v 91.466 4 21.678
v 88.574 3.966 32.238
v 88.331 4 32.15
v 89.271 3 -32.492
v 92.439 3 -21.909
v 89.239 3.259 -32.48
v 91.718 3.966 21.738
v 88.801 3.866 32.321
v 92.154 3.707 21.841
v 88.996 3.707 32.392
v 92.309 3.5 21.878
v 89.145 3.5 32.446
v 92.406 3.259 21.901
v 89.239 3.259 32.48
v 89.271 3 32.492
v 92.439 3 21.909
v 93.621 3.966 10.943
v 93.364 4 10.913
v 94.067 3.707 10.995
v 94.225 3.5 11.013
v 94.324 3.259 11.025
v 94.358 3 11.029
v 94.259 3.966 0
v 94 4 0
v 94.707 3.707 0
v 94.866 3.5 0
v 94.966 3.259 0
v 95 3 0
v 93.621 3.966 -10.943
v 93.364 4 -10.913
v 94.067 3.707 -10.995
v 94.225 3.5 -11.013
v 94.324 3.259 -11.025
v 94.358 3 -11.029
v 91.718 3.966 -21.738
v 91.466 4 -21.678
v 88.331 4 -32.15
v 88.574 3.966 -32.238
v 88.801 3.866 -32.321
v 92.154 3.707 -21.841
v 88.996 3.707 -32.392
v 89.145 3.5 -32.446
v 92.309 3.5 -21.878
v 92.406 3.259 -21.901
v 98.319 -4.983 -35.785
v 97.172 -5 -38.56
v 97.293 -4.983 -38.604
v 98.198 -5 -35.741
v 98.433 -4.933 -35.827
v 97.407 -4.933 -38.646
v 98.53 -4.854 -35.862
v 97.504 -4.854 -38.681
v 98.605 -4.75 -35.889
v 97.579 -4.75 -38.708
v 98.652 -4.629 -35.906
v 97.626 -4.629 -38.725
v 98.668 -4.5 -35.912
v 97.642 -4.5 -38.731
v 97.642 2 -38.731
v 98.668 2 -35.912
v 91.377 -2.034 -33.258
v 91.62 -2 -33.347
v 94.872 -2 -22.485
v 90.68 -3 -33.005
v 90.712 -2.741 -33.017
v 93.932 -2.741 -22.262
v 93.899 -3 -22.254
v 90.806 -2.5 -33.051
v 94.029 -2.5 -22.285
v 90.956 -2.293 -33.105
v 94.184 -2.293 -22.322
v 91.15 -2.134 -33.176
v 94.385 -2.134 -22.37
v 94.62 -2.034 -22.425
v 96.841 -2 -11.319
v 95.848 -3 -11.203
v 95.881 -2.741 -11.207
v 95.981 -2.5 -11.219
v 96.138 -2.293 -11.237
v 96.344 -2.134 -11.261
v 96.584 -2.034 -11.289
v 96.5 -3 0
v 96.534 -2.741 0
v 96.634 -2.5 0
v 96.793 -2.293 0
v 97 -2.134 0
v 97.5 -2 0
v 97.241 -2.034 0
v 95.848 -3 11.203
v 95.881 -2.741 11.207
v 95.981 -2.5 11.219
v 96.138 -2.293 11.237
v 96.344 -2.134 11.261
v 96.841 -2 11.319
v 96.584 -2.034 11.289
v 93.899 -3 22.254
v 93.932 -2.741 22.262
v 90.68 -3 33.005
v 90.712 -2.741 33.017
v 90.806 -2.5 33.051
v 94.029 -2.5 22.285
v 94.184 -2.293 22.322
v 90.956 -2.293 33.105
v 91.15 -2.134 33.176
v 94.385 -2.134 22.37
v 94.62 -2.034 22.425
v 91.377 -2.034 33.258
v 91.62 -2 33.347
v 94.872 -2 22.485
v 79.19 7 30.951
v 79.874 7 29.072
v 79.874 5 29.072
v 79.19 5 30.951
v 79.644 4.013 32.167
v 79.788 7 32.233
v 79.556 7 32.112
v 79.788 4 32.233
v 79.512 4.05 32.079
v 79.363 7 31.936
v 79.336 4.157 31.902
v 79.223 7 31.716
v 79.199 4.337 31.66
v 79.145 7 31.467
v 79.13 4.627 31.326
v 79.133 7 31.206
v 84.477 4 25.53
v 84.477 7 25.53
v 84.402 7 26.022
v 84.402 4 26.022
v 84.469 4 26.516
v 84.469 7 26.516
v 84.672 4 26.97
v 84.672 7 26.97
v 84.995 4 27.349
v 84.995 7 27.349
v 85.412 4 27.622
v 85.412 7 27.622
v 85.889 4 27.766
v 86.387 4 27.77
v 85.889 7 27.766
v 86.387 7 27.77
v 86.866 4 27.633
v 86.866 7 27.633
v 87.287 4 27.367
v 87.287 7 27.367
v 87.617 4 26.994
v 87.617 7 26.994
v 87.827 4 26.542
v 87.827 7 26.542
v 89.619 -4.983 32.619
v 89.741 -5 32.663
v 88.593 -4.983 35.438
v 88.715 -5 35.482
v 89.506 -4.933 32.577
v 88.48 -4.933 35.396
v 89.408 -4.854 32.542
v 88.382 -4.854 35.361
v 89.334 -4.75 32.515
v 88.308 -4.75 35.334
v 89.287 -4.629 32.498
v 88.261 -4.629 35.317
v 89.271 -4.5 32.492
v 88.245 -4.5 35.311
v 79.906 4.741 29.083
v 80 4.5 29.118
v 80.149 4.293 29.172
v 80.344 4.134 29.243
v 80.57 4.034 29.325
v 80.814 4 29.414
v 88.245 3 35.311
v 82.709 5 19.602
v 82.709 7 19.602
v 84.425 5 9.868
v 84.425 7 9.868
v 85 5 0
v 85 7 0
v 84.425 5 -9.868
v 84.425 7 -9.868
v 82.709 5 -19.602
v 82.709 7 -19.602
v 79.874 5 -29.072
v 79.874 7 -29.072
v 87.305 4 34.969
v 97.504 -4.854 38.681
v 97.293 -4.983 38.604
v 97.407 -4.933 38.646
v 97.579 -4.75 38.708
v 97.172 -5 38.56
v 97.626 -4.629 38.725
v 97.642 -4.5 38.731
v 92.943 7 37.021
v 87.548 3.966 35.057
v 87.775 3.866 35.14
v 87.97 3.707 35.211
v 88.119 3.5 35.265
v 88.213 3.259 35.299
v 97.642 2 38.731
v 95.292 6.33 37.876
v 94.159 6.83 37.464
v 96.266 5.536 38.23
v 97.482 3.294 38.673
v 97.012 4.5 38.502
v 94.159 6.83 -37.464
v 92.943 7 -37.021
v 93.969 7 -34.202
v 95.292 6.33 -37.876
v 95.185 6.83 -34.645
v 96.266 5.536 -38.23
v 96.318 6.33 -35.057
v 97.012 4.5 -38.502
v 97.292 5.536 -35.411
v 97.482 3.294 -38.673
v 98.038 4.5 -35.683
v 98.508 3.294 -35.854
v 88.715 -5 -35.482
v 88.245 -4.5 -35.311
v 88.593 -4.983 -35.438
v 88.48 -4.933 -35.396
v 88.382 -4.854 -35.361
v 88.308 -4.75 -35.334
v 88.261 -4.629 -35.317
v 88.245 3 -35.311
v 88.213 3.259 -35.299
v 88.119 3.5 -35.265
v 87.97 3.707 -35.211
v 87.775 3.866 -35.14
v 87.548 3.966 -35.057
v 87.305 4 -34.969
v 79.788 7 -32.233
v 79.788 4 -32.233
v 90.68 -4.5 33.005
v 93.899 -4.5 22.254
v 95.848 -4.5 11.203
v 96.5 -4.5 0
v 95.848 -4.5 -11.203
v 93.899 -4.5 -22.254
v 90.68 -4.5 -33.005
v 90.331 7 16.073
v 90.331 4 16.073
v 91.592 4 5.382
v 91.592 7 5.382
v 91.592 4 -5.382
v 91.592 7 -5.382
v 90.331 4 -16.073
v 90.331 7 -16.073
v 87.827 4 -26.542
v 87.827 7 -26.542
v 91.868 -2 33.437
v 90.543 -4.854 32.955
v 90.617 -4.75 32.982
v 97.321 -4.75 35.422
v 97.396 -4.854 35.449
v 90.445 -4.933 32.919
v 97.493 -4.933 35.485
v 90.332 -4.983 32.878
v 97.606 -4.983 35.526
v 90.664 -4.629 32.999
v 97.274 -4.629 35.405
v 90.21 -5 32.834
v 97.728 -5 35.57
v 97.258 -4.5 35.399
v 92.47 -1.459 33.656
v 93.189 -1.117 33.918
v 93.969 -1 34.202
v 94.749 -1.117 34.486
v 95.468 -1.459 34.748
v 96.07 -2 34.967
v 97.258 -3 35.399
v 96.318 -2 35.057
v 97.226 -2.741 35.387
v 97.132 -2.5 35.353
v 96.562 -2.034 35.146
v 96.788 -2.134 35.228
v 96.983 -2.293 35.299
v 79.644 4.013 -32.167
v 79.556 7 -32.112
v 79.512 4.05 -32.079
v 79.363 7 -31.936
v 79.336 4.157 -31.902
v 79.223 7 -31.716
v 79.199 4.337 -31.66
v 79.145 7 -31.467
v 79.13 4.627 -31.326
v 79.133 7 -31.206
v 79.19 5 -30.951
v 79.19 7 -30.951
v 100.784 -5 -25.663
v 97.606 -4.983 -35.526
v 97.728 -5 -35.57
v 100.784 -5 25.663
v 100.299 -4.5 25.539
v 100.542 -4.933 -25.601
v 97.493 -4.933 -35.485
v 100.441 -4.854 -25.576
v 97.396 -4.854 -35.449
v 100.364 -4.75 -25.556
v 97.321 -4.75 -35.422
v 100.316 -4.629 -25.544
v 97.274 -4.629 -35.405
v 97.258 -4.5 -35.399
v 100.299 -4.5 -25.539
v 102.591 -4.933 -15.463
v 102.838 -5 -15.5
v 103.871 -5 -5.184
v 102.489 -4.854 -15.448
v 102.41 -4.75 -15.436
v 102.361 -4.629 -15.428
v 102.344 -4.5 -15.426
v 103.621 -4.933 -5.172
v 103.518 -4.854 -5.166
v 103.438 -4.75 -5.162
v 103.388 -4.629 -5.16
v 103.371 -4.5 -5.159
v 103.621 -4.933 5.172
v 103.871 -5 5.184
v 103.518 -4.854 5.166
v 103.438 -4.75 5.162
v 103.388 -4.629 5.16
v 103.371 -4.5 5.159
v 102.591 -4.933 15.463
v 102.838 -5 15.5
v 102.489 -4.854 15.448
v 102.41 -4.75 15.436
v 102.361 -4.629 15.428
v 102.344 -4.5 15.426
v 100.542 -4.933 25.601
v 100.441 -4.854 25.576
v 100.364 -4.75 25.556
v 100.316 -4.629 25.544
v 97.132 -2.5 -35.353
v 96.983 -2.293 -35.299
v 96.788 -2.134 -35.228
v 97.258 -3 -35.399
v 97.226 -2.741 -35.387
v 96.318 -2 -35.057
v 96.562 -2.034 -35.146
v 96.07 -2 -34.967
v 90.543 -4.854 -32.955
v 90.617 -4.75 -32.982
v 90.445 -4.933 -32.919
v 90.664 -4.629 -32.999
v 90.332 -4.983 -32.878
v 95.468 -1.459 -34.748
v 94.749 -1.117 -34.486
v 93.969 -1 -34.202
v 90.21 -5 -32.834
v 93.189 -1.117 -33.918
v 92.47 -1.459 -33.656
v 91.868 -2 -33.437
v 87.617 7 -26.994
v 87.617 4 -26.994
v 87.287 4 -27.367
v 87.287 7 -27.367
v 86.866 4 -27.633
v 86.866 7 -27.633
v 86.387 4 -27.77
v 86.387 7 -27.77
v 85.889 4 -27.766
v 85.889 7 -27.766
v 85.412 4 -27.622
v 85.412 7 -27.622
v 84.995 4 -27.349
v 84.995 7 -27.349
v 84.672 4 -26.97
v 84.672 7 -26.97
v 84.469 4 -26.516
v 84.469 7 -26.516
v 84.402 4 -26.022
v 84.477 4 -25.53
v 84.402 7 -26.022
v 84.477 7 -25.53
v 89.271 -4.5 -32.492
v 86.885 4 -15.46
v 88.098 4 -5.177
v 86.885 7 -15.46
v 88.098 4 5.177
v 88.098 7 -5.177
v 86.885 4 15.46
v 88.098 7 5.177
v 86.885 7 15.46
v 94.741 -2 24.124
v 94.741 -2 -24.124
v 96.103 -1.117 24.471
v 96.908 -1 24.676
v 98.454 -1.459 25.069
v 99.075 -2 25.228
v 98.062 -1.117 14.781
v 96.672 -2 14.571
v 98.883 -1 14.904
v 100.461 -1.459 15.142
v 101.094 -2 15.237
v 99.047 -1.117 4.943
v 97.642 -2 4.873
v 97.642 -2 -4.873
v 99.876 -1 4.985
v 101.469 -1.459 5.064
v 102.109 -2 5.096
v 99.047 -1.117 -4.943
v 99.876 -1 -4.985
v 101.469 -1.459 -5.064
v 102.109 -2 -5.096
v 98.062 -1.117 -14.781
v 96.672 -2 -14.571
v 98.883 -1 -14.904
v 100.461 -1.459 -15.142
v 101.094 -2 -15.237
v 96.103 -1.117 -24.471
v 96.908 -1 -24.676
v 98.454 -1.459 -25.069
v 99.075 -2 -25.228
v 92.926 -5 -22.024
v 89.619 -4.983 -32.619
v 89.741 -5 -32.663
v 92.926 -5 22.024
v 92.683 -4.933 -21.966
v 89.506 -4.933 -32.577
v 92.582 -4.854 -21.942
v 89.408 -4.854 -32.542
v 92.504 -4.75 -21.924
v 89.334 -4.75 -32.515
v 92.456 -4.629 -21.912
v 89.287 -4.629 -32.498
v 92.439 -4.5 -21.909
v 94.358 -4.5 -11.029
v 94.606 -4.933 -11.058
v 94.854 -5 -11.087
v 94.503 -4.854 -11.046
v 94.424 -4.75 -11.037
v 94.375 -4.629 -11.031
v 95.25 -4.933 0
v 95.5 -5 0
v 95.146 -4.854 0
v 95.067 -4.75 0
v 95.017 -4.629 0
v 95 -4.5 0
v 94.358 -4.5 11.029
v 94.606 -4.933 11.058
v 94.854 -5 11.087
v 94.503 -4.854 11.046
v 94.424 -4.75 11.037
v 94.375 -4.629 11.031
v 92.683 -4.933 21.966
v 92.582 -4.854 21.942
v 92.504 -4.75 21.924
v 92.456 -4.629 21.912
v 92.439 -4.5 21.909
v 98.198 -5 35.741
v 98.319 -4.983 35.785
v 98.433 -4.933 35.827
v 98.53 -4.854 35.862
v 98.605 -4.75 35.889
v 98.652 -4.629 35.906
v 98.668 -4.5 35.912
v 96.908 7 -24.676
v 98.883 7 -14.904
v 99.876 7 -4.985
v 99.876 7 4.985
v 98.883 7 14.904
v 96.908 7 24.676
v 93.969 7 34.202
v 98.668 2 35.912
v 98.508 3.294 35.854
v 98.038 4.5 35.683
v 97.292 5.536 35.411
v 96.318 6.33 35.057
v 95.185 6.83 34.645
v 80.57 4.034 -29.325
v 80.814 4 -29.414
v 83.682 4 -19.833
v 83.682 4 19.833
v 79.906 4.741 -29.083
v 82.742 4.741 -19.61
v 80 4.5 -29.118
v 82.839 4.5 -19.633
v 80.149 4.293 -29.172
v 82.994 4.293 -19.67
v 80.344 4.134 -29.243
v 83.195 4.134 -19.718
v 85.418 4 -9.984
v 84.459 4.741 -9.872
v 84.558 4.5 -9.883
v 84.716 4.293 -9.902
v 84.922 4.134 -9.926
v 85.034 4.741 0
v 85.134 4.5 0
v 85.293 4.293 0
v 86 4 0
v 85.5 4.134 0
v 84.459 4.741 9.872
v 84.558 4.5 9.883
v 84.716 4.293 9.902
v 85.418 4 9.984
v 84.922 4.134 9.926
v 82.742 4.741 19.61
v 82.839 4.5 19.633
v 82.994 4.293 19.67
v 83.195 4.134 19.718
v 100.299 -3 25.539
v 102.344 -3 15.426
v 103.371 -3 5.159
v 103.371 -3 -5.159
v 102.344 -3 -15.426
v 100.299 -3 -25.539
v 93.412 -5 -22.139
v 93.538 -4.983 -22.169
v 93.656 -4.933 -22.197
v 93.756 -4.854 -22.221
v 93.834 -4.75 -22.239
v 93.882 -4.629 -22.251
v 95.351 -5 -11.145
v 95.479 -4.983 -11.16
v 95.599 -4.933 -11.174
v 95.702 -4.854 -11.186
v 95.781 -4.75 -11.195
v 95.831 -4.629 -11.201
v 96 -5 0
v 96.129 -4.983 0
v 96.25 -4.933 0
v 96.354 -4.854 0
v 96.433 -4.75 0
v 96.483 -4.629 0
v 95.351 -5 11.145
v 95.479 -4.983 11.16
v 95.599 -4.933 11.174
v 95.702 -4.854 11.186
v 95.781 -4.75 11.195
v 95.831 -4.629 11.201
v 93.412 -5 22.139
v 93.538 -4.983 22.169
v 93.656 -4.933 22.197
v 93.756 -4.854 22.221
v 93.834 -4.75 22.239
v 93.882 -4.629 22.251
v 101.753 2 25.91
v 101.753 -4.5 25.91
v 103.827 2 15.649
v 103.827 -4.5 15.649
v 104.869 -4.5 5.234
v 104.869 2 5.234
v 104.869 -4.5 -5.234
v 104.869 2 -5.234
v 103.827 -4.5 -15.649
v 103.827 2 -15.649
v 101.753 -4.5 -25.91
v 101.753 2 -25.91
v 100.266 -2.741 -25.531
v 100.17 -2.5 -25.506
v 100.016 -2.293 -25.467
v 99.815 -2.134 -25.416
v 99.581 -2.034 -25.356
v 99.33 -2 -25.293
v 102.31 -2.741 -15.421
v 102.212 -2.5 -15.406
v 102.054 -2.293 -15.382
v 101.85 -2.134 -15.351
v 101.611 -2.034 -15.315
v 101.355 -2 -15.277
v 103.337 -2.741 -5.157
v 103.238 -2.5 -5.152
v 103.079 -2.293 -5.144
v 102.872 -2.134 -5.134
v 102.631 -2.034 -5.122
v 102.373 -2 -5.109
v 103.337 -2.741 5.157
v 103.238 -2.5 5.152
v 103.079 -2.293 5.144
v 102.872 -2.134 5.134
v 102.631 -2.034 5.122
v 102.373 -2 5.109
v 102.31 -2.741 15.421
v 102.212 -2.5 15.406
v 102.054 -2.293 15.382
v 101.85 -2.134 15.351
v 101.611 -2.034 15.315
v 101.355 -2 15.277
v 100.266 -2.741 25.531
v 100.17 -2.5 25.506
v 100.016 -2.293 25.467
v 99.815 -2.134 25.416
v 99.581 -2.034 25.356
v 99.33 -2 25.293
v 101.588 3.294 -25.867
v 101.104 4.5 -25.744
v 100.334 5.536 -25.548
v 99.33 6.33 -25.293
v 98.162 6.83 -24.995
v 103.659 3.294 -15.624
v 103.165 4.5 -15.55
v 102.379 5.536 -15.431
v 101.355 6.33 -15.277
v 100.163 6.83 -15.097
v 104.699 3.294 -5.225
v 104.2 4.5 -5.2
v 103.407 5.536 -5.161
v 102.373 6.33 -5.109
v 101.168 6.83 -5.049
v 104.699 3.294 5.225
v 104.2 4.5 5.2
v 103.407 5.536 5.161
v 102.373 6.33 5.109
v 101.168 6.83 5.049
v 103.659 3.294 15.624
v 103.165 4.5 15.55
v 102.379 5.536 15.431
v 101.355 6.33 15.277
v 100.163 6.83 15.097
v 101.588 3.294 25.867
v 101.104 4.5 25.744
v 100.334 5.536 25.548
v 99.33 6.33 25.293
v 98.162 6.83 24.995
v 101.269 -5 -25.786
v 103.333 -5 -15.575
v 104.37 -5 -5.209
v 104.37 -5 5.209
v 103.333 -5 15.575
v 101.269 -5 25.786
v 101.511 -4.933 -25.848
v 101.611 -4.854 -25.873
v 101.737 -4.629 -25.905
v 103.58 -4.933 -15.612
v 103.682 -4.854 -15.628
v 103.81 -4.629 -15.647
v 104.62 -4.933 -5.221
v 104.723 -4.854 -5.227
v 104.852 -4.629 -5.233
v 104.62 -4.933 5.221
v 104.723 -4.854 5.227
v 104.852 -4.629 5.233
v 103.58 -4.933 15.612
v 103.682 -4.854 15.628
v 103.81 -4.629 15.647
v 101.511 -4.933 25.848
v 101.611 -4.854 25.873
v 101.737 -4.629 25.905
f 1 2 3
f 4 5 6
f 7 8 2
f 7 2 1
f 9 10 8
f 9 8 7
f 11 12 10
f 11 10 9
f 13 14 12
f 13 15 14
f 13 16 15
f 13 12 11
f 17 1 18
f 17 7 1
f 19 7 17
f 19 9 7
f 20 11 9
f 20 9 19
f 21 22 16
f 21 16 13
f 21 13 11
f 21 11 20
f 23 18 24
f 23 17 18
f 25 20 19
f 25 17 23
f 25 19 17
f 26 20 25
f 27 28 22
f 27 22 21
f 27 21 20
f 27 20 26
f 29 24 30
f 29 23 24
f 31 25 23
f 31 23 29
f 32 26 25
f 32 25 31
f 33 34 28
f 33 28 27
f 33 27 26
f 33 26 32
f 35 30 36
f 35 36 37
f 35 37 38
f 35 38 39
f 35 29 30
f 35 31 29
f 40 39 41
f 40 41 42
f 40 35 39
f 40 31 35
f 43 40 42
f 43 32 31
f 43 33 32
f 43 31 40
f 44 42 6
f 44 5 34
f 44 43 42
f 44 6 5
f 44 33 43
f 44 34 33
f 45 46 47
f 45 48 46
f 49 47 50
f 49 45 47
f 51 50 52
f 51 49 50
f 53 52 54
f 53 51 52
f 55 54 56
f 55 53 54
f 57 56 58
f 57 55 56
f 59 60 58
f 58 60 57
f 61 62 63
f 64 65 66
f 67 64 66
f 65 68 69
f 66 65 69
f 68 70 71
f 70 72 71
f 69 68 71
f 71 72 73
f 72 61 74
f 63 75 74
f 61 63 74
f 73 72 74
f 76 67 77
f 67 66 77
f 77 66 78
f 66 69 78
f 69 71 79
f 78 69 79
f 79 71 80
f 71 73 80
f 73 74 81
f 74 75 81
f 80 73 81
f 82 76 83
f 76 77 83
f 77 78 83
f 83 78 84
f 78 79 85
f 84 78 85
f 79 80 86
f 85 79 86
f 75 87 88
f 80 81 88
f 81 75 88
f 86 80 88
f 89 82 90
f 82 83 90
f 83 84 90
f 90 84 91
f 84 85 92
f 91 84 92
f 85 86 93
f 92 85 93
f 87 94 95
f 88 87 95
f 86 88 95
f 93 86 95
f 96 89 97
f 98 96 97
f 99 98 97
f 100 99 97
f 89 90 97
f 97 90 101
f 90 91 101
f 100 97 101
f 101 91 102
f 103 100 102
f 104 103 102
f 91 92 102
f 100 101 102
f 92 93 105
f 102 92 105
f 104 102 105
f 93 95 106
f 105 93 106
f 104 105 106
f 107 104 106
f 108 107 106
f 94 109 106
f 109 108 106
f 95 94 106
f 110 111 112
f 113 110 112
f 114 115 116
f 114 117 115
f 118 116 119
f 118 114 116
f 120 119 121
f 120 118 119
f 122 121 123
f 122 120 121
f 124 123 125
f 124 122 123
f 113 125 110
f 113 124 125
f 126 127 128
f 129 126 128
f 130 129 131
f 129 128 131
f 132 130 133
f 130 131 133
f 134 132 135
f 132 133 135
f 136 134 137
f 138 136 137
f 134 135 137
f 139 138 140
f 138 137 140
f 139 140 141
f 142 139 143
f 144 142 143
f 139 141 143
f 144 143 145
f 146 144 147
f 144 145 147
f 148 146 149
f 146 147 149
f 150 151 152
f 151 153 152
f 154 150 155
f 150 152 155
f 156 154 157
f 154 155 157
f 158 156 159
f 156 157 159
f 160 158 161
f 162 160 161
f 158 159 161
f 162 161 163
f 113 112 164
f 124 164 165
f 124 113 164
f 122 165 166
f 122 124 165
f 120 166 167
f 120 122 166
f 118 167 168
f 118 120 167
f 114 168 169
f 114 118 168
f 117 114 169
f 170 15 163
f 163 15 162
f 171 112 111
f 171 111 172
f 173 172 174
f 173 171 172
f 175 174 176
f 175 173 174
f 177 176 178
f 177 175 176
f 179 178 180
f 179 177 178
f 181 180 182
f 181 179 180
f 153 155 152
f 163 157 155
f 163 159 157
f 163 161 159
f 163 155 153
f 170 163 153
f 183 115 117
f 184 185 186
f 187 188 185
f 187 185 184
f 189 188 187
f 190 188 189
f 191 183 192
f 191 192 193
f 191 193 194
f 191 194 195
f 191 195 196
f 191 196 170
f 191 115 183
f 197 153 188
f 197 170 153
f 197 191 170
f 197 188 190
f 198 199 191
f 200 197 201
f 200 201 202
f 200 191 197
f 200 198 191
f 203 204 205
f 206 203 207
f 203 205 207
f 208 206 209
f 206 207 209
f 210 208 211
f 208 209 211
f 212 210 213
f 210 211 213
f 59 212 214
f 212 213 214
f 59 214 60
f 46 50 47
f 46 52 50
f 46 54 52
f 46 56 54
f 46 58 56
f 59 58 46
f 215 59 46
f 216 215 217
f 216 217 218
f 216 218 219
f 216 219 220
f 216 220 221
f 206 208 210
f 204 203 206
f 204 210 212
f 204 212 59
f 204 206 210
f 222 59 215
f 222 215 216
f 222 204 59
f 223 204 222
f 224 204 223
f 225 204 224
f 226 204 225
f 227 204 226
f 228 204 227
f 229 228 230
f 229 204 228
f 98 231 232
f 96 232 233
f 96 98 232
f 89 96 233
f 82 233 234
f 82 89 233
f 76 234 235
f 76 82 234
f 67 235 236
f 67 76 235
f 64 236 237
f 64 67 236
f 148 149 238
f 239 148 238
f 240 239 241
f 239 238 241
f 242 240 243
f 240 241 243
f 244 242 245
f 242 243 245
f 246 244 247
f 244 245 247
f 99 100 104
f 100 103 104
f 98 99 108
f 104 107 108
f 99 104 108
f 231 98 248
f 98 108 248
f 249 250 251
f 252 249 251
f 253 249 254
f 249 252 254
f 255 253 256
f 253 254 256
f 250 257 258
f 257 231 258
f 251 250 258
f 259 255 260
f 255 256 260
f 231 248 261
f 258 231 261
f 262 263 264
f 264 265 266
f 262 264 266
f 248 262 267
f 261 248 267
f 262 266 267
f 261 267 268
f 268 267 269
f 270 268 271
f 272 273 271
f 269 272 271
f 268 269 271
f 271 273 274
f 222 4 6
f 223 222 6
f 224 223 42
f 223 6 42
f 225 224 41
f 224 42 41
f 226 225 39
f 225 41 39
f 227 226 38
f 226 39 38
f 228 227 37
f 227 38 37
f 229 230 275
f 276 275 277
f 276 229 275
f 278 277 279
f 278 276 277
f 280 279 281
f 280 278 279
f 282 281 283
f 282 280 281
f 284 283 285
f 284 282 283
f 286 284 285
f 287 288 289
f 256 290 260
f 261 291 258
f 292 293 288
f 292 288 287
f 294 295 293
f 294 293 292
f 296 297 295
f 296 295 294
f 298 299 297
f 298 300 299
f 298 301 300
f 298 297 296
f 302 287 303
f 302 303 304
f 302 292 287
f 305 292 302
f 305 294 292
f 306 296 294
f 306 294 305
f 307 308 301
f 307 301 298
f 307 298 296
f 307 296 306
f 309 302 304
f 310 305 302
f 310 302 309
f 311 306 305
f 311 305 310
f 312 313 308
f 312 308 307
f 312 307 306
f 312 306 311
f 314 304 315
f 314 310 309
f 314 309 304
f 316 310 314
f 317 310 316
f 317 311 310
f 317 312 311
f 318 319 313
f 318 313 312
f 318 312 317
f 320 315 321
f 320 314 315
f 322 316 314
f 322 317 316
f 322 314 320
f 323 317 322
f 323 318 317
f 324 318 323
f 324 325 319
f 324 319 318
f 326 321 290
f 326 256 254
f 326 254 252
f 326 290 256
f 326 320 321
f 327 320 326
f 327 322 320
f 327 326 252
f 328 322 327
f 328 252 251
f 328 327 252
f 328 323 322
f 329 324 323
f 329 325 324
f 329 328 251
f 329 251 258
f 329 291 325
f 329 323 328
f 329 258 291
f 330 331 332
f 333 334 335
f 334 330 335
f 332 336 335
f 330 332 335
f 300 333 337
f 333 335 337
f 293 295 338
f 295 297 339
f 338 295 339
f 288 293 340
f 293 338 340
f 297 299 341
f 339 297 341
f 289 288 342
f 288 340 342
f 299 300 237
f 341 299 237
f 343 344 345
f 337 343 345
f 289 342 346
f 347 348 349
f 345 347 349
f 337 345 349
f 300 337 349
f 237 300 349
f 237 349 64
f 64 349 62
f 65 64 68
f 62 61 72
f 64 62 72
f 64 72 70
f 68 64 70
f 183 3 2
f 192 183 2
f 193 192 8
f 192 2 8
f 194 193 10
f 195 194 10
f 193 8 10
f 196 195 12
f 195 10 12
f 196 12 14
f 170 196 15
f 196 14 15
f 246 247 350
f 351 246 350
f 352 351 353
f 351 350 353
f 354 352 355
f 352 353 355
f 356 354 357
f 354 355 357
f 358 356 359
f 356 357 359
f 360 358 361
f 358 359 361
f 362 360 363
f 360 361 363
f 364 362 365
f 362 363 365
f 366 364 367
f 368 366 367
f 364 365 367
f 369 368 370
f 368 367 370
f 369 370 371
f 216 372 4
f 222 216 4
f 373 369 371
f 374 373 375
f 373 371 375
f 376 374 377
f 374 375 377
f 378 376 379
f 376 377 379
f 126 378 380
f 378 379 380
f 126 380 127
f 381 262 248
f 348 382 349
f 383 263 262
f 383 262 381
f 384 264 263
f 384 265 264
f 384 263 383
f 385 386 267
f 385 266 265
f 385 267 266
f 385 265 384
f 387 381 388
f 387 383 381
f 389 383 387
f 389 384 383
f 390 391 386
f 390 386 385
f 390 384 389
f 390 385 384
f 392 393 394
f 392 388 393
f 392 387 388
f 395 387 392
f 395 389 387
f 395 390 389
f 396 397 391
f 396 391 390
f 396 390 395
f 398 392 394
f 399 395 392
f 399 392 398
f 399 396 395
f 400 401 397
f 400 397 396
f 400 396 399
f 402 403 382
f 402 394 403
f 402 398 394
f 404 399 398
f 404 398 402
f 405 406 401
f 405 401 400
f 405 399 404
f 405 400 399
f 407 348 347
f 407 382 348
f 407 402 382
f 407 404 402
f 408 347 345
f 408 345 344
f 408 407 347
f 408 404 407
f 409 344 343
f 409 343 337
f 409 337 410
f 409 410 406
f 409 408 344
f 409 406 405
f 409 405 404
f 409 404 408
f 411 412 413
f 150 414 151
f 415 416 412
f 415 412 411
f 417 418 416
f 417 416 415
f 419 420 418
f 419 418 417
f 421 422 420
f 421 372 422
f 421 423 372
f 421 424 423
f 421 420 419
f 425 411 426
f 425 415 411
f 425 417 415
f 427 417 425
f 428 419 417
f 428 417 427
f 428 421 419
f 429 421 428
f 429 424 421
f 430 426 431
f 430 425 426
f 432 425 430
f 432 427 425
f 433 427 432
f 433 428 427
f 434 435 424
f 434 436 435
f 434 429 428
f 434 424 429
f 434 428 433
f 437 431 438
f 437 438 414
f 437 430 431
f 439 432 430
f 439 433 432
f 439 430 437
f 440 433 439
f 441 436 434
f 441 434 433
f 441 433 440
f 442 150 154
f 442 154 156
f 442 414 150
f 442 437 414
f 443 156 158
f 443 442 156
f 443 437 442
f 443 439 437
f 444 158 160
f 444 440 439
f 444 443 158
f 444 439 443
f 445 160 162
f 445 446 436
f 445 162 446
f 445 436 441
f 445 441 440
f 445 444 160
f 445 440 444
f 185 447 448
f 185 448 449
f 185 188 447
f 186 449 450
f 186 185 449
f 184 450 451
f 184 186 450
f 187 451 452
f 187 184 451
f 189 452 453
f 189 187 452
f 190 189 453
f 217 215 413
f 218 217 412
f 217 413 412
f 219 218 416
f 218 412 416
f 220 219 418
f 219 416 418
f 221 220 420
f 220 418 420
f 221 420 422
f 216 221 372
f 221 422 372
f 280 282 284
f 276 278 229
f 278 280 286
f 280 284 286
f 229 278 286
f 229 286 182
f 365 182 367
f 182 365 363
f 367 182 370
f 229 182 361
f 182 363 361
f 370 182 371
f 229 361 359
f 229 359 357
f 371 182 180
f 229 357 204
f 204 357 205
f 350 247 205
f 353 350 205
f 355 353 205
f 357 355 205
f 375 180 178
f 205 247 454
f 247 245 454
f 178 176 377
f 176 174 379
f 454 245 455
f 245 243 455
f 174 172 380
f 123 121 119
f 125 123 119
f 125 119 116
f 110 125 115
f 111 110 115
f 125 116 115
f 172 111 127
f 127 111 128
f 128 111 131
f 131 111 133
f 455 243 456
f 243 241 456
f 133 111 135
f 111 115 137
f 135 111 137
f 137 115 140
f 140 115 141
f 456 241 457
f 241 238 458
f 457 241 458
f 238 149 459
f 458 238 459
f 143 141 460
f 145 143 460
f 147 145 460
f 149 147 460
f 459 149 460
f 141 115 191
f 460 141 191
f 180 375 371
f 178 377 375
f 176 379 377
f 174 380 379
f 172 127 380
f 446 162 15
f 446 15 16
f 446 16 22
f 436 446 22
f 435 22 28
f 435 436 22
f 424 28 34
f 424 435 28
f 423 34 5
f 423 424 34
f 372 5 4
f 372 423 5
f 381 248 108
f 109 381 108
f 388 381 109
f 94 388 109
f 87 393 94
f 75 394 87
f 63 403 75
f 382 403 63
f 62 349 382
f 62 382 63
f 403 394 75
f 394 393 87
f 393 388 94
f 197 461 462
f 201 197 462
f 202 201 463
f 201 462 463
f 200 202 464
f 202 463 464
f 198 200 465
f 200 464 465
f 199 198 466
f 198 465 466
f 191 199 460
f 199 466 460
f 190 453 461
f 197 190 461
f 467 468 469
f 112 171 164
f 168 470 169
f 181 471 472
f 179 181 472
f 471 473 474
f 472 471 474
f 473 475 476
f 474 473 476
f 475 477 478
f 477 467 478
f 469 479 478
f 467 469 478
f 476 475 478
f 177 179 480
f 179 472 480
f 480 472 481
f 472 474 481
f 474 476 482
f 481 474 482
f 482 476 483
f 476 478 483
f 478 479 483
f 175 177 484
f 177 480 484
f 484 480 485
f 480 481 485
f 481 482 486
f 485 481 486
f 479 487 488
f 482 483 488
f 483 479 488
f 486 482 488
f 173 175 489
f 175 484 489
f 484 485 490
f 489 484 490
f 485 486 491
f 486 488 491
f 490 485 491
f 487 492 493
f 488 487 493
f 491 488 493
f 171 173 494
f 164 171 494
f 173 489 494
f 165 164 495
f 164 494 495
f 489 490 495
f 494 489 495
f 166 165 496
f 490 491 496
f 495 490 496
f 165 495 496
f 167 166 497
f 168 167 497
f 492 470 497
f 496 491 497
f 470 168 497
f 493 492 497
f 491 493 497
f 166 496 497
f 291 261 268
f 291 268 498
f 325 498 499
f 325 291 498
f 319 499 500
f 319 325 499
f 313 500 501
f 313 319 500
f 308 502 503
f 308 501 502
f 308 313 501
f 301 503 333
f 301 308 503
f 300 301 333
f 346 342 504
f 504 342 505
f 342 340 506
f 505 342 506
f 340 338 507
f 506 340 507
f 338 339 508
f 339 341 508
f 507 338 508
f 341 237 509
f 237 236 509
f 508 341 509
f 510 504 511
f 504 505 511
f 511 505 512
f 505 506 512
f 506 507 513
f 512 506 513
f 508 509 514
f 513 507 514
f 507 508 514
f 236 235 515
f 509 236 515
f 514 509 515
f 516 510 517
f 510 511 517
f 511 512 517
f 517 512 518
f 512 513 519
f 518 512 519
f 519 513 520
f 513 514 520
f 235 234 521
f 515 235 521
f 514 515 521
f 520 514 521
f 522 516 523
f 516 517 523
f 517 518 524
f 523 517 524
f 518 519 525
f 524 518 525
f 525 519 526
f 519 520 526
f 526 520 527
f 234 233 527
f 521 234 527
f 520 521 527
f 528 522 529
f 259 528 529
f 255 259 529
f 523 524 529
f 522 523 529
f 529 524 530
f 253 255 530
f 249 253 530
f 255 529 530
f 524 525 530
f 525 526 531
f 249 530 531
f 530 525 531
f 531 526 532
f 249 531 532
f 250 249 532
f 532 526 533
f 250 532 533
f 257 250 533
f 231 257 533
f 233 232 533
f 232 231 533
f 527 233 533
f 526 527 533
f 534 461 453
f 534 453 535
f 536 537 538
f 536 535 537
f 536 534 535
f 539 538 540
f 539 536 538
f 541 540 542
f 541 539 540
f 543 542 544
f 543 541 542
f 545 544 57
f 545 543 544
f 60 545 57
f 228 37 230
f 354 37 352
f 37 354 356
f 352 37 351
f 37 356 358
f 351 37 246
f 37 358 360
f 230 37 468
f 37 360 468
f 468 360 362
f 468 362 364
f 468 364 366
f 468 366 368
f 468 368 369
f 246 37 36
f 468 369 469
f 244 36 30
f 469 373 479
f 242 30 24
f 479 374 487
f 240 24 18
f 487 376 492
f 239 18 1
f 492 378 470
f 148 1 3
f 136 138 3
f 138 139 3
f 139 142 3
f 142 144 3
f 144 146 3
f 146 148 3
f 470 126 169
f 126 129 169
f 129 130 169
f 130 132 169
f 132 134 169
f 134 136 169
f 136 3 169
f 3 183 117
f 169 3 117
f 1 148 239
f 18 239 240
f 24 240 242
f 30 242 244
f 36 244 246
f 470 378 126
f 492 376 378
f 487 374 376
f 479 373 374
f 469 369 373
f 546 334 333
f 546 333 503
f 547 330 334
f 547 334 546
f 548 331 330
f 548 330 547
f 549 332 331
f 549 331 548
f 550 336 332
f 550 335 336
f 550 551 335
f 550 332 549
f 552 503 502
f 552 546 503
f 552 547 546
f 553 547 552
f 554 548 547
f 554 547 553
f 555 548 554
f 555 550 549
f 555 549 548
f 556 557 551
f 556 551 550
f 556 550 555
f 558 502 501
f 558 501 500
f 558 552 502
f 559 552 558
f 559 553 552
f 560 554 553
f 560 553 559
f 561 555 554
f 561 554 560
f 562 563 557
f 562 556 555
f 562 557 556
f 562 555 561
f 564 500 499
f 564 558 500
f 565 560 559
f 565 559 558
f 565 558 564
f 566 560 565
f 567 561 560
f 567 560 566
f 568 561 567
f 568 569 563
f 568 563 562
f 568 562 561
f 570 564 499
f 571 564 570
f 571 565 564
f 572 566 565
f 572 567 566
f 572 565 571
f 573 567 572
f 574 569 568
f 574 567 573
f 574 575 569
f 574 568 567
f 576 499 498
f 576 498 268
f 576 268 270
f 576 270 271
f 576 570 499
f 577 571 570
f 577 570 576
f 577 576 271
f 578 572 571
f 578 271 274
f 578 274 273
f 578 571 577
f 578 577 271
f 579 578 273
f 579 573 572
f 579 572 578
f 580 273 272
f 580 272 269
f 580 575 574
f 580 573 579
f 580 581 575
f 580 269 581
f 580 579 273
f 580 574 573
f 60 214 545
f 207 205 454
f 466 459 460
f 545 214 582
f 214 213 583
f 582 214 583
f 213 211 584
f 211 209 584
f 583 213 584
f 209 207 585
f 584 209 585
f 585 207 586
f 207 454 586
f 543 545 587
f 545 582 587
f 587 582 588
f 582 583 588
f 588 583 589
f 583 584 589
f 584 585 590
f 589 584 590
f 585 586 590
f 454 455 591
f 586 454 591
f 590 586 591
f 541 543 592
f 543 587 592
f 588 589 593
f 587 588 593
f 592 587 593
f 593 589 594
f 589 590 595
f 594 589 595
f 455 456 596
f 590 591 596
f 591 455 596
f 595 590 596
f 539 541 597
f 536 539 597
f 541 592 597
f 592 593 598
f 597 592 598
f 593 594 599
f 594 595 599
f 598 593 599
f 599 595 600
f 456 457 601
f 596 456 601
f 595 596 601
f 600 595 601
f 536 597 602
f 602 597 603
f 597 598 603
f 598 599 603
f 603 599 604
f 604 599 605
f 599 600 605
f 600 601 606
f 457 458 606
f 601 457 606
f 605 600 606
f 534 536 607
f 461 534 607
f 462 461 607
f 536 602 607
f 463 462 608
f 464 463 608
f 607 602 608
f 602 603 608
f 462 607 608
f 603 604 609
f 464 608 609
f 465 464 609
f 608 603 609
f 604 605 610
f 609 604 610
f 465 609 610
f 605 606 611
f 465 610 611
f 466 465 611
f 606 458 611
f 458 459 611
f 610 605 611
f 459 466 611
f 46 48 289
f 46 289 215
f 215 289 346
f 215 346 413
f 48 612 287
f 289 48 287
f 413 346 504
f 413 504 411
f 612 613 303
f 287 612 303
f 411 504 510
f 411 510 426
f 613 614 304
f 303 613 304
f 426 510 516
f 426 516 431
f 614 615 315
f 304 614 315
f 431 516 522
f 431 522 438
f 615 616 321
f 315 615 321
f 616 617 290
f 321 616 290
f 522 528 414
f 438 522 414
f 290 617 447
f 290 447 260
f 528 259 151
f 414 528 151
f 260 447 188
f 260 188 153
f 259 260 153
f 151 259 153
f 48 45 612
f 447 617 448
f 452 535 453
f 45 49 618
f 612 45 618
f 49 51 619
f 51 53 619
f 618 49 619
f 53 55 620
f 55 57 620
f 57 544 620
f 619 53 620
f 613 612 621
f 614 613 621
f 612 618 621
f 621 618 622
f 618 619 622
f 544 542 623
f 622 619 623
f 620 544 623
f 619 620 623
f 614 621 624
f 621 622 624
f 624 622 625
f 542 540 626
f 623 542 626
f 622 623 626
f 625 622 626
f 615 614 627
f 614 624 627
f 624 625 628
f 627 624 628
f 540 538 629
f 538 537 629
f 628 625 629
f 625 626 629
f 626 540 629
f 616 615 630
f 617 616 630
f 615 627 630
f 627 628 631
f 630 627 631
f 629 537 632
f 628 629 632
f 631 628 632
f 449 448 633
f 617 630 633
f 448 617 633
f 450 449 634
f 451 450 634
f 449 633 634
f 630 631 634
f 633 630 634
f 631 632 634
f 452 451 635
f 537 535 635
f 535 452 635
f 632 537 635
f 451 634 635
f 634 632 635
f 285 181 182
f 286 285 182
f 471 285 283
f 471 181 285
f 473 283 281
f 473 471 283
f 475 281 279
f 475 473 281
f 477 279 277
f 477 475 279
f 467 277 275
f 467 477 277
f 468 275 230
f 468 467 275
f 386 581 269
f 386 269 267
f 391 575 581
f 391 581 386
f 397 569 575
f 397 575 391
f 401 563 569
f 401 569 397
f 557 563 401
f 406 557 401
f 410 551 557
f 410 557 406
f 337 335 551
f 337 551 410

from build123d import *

# Parameters (mm, degrees)
REVOLVE_1_ANGLE     = 40
CUT_EXTRUDE_1_DEPTH = 10
FILLET_1_R          = 5
FILLET_3_R          = 1
FILLET_4_R          = 1
EXTRUDE_1_DEPTH     = 3
EXTRUDE_2_DEPTH     = 3
FILLET_6_R          = 0.5
FILLET_7_R          = 1


with BuildPart() as part:
    # 草图2 → 旋转1 (revolve, symmetric)
    with BuildSketch(Plane.XY) as revolve_1_sk:
        with BuildLine():
            Line((95, 4), (95, -5))
            Line((95, -5), (96.5, -5))
            Line((96.5, -5), (96.5, -2))
            Line((96.5, -2), (97.763932023, -2))
            ThreePointArc((97.763932023, -2), (100, -1), (102.236067977, -2))
            Line((102.236067977, -2), (103.5, -2))
            Line((103.5, -2), (103.5, -5))
            Line((103.5, -5), (105, -5))
            Line((105, -5), (105, 7))
            Line((105, 7), (85, 7))
            Line((85, 7), (85, 4))
            Line((85, 4), (95, 4))
        make_face()
    revolve(axis=Axis((0, 24.366902053, 0), (0, -1, 0)), revolution_arc=REVOLVE_1_ANGLE / 2)
    revolve(revolve_1_sk.sketch, axis=Axis((0, 24.366902053, 0), (0, 1, 0)), revolution_arc=REVOLVE_1_ANGLE / 2)

    # 草图3 → 切除-拉伸1 (cut)
    with BuildSketch(Plane(origin=(0, 7, 0), x_dir=(1, 0, 0), z_dir=(0, 1, 0))):
        with BuildLine():
            ThreePointArc((87.826997293, -26.542061834), (91.75, 1.18e-07), (87.826997225, 26.542062061))
            ThreePointArc((87.826997225, 26.542062061), (85.645571172, 27.710984674), (84.476648452, 25.529558679))
            ThreePointArc((84.476648452, 25.529558679), (88.25, 3.69e-07), (84.476648665, -25.529557973))
            ThreePointArc((84.476648665, -25.529557973), (85.645570933, -27.710984602), (87.826997293, -26.542061834))
        make_face()
    extrude(amount=-CUT_EXTRUDE_1_DEPTH, mode=Mode.SUBTRACT)

    # 圆角1
    fillet_1_edges = [part.edges().sort_by_distance(p)[0] for p in [
        (105, 7, 0),
    ]]
    fillet(fillet_1_edges, radius=FILLET_1_R)

    # 圆角3
    fillet_3_edges = [part.edges().sort_by_distance(p)[0] for p in [
        (95, 4, 0),
    ]]
    fillet(fillet_3_edges, radius=FILLET_3_R)

    # 圆角4
    fillet_4_edges = [part.edges().sort_by_distance(p)[0] for p in [
        (103.5, -2, 0),
        (96.5, -2, 0),
    ]]
    fillet(fillet_4_edges, radius=FILLET_4_R)

    # 草图5 → 凸台-拉伸1 (add)
    with BuildSketch(Plane(origin=(0, 0, 0), x_dir=(0.9396926207859081, 0, 0.34202014332566955), z_dir=(-0.34202014332566955, 0, 0.9396926207859082))):
        with BuildLine():
            Line((96.5, -5), (103.5, -5))
            Line((103.5, -5), (103.5, -3))
            ThreePointArc((103.5, -3), (103.207106781, -2.292893219), (102.5, -2))
            Line((102.5, -2), (102.236067977, -2))
            ThreePointArc((102.236067977, -2), (100, -1), (97.763932023, -2))
            Line((97.763932023, -2), (97.5, -2))
            ThreePointArc((97.5, -2), (96.792893219, -2.292893219), (96.5, -3))
            Line((96.5, -3), (96.5, -5))
        make_face()
        with BuildLine():
            Line((103.5, -5), (105, -5))
            Line((105, -5), (105, 2))
            ThreePointArc((105, 2), (103.535533906, 5.535533906), (100, 7))
            Line((100, 7), (85, 7))
            Line((85, 7), (85, 4))
            Line((85, 4), (94, 4))
            ThreePointArc((94, 4), (94.707106781, 3.707106781), (95, 3))
            Line((95, 3), (95, -5))
            Line((95, -5), (96.5, -5))
            Line((96.5, -5), (96.5, -3))
            ThreePointArc((96.5, -3), (96.792893219, -2.292893219), (97.5, -2))
            Line((97.5, -2), (97.763932023, -2))
            ThreePointArc((97.763932023, -2), (100, -1), (102.236067977, -2))
            Line((102.236067977, -2), (102.5, -2))
            ThreePointArc((102.5, -2), (103.207106781, -2.292893219), (103.5, -3))
            Line((103.5, -3), (103.5, -5))
        make_face()
    extrude(amount=EXTRUDE_1_DEPTH)

    # 草图6 → 凸台-拉伸2 (add)
    with BuildSketch(Plane(origin=(0, 0, 0), x_dir=(-0.9396926207859082, 0, 0.34202014332566943), z_dir=(-0.34202014332566943, 0, -0.9396926207859082))):
        with BuildLine():
            Line((-103.5, -5), (-96.5, -5))
            Line((-96.5, -5), (-96.5, -3))
            ThreePointArc((-96.5, -3), (-96.792893219, -2.292893219), (-97.5, -2))
            Line((-97.5, -2), (-97.763932023, -2))
            ThreePointArc((-97.763932023, -2), (-100, -1), (-102.236067977, -2))
            Line((-102.236067977, -2), (-102.5, -2))
            ThreePointArc((-102.5, -2), (-103.207106781, -2.292893219), (-103.5, -3))
            Line((-103.5, -3), (-103.5, -5))
        make_face()
        with BuildLine():
            Line((-85, 4), (-85, 7))
            Line((-85, 7), (-100, 7))
            ThreePointArc((-100, 7), (-103.535533906, 5.535533906), (-105, 2))
            Line((-105, 2), (-105, -5))
            Line((-105, -5), (-103.5, -5))
            Line((-103.5, -5), (-103.5, -3))
            ThreePointArc((-103.5, -3), (-103.207106781, -2.292893219), (-102.5, -2))
            Line((-102.5, -2), (-102.236067977, -2))
            ThreePointArc((-102.236067977, -2), (-100, -1), (-97.763932023, -2))
            Line((-97.763932023, -2), (-97.5, -2))
            ThreePointArc((-97.5, -2), (-96.792893219, -2.292893219), (-96.5, -3))
            Line((-96.5, -3), (-96.5, -5))
            Line((-96.5, -5), (-95, -5))
            Line((-95, -5), (-95, 3))
            ThreePointArc((-95, 3), (-94.707106781, 3.707106781), (-94, 4))
            Line((-94, 4), (-85, 4))
        make_face()
    extrude(amount=EXTRUDE_2_DEPTH)

    # 圆角6
    fillet_6_edges = [part.edges().sort_by_distance(p)[0] for p in [
        (88.75776876, -5, 33.901452547),
        (98.154694968, -5, 37.32165398),
        (98.154694968, -5, -37.32165398),
        (88.75776876, -5, -33.901452547),
        (105, -5, 0),
        (103.5, -5, 0),
        (96.5, -5, 0),
        (95, -5, 0),
    ]]
    fillet(fillet_6_edges, radius=FILLET_6_R)

    # 圆角7
    fillet_7_edges = [part.edges().sort_by_distance(p)[0] for p in [
        (79.360842552, 4, 30.481251114),
        (78.847812337, 5.5, 31.890790045),
        (79.360842552, 4, -30.481251114),
        (78.847812337, 5.5, -31.890790045),
        (85, 4, 0),
    ]]
    fillet(fillet_7_edges, radius=FILLET_7_R)


solid = part.part
